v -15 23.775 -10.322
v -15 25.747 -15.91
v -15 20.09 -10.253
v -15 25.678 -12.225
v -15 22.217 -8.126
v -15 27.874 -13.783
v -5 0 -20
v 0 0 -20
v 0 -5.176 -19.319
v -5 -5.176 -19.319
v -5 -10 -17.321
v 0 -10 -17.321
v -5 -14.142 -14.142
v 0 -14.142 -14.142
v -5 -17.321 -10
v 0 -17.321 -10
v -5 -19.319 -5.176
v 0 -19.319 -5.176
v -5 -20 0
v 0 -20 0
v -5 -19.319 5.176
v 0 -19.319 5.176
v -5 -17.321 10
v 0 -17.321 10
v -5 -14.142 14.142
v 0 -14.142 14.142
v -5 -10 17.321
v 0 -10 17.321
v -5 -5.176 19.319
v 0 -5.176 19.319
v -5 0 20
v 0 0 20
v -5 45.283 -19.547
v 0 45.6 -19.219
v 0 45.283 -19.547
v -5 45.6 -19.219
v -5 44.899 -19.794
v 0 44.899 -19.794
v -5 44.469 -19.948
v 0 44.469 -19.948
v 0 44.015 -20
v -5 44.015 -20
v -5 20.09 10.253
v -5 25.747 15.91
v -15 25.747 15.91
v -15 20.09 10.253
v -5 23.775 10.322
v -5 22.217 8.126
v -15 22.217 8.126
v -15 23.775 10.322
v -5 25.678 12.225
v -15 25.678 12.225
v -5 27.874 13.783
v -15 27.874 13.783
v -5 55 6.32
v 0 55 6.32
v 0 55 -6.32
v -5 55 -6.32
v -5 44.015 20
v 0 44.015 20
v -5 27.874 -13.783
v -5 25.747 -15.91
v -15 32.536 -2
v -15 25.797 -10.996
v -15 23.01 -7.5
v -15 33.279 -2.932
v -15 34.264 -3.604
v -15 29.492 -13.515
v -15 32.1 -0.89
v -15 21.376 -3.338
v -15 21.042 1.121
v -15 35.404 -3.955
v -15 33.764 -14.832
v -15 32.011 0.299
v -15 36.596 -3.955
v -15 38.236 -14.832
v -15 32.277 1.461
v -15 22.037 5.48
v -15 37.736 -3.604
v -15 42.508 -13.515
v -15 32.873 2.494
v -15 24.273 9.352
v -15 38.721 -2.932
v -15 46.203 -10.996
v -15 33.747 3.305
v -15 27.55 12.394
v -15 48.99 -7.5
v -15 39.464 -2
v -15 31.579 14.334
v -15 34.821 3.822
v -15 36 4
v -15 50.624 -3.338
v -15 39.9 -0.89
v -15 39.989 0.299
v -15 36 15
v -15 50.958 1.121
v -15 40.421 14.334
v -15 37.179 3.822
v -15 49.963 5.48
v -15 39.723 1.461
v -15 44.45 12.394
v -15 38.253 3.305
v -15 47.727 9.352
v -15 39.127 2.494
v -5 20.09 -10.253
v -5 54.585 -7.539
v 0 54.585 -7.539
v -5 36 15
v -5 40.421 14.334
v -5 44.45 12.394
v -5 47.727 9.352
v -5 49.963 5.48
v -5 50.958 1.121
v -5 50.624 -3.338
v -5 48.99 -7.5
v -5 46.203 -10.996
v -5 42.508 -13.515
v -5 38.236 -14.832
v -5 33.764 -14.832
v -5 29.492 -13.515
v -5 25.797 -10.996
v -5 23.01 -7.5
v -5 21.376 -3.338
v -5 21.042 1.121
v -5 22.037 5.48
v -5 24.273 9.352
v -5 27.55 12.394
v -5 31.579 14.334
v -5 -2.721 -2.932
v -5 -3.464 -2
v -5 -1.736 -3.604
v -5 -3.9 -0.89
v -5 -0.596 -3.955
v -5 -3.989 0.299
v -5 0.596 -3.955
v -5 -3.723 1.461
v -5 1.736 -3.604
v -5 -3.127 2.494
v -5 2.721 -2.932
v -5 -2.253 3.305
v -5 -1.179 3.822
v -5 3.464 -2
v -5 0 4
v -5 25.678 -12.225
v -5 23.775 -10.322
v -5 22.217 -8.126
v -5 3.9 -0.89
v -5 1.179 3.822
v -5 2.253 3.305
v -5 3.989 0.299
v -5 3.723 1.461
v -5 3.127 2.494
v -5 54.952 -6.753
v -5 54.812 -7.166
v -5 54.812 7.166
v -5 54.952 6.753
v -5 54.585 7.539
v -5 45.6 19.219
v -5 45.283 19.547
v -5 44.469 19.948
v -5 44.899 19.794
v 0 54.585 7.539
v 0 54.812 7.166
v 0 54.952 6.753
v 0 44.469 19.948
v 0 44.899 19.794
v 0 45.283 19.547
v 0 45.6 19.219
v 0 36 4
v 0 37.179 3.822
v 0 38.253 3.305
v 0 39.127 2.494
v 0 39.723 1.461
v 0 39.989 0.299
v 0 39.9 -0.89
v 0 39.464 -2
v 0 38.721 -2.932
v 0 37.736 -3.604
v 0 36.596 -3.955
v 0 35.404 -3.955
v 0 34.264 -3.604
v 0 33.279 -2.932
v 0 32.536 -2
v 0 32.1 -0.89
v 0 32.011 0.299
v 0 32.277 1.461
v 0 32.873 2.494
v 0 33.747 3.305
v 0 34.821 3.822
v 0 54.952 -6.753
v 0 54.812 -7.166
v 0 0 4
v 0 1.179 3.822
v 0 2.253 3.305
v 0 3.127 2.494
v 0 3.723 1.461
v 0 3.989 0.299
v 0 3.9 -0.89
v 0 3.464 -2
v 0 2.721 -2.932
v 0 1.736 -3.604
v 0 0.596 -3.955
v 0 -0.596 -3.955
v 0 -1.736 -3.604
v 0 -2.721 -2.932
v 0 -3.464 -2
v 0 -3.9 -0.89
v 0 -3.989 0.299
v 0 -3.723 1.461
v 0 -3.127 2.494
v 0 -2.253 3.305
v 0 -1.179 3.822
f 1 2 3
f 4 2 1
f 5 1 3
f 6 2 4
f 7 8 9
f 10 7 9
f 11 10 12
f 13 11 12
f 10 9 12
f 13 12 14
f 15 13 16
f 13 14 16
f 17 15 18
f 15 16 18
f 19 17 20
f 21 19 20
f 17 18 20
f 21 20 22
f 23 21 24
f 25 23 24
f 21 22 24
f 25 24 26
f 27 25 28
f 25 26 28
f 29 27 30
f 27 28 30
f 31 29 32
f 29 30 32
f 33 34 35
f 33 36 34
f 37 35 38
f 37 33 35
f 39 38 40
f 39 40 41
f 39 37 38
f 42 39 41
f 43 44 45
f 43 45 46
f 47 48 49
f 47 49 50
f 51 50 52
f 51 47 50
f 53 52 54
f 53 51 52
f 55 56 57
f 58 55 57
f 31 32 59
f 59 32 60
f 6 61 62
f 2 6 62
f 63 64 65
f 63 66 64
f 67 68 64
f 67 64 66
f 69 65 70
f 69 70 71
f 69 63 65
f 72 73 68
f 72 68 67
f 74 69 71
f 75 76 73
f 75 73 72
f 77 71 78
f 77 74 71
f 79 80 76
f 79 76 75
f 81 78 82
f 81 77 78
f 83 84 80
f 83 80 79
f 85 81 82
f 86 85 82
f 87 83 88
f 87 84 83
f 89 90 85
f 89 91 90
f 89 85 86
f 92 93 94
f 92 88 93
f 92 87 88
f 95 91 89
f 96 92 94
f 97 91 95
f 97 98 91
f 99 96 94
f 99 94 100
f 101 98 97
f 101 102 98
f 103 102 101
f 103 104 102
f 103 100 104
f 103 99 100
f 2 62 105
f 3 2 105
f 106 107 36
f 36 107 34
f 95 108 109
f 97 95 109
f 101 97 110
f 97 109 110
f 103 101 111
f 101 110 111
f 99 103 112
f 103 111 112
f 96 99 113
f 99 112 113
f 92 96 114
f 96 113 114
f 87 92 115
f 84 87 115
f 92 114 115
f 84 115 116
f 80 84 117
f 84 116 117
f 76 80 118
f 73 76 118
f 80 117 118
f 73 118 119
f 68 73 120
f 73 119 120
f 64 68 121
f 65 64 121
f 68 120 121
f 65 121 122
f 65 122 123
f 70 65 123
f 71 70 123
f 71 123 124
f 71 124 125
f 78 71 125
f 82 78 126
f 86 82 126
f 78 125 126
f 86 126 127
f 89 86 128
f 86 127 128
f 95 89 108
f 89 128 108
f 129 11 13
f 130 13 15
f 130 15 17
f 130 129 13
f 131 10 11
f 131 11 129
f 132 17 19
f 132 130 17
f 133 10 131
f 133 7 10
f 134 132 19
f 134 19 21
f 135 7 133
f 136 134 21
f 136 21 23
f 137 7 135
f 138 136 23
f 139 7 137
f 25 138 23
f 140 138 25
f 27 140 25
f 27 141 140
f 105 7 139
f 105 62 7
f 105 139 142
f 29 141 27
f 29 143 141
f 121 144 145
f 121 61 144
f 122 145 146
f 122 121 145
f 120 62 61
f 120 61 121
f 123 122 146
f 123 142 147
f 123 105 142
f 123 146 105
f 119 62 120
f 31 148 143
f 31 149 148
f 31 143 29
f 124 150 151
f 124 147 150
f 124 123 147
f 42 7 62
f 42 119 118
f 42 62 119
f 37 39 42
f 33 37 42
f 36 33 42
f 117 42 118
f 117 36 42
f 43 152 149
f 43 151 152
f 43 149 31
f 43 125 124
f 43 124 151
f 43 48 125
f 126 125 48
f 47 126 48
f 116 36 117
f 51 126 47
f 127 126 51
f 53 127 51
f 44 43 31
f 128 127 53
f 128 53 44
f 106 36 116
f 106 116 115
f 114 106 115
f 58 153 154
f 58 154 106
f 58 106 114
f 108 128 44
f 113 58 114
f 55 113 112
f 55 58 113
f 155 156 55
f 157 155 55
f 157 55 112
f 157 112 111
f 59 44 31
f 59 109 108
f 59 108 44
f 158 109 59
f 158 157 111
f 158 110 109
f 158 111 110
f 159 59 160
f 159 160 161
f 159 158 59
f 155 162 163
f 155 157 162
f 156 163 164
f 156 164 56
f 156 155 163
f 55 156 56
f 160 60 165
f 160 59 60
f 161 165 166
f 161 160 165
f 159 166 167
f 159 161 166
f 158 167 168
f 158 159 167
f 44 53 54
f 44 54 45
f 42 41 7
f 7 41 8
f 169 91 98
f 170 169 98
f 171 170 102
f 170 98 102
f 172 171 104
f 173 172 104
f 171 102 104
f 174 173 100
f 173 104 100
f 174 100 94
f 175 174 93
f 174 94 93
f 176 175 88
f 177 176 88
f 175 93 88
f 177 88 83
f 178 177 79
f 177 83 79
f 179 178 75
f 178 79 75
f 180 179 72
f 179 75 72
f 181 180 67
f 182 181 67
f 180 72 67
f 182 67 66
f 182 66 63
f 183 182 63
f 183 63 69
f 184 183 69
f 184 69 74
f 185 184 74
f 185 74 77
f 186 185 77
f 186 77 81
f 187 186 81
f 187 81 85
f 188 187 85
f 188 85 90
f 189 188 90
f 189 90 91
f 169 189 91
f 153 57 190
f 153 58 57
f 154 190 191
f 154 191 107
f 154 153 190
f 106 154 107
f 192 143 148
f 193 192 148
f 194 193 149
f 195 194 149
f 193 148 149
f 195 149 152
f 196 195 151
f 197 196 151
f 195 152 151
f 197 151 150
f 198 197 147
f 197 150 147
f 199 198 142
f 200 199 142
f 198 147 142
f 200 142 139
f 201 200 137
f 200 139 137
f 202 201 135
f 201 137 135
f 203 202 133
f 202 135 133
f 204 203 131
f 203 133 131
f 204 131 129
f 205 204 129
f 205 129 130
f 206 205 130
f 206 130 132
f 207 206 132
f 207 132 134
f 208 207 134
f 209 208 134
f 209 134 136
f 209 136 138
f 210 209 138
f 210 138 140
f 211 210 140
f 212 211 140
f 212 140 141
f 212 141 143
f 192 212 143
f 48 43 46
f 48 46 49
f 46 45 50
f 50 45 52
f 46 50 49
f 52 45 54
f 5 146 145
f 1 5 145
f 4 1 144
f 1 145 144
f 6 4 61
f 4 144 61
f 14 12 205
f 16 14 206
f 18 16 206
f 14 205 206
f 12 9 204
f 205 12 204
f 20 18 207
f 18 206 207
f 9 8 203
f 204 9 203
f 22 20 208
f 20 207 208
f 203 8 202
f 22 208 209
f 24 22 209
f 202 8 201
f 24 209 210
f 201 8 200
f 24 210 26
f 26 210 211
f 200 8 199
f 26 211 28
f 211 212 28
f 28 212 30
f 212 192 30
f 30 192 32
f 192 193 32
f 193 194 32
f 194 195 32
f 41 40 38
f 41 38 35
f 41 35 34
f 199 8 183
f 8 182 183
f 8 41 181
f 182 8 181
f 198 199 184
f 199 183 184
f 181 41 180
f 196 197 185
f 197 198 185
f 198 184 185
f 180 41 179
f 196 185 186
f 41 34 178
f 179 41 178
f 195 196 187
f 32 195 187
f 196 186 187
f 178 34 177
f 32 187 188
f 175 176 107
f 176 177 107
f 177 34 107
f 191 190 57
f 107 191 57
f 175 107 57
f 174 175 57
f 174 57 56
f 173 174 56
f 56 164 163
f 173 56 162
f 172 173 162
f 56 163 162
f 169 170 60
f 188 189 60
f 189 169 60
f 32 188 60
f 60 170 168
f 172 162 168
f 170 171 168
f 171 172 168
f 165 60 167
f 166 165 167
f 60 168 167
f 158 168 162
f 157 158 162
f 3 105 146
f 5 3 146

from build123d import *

# Parameters (mm, degrees)
AUFSATZ_LINEAR_AUSTRAGEN1_DEPTH = 5
VERRUNDUNG2_R                   = 2
SKIZZE7_R                       = 15
AUFSATZ_LINEAR_AUSTRAGEN3_DEPTH = 10
AUFSATZ_LINEAR_AUSTRAGEN5_DEPTH = 10
SCHNITT_LINEAR_AUSTRAGEN2_REACH = 17
SKIZZE9_R                       = 4
SCHNITT_LINEAR_AUSTRAGEN3_REACH = 7
SKIZZE10_R                      = 4


with BuildPart() as part:
    # Skizze1 → Aufsatz-Linear austragen1 (new body)
    with BuildSketch(Plane(origin=(0, 0, 0), x_dir=(0, 0, -1), z_dir=(1, 0, 0))):
        with BuildLine():
            Line((-20, 0), (-20, 45))
            Line((-20, 45), (-7, 55))
            Line((-7, 55), (7, 55))
            Line((7, 55), (20, 45))
            Line((20, 45), (20, 0))
            ThreePointArc((20, 0), (0, -20), (-20, 0))
        make_face()
    extrude(amount=-AUFSATZ_LINEAR_AUSTRAGEN1_DEPTH)

    # Verrundung2
    verrundung2_edges = [part.edges().sort_by_distance(p)[0] for p in [
        (-2.5, 45, 20),
        (-2.5, 55, 7),
        (-2.5, 55, -7),
        (-2.5, 45, -20),
    ]]
    fillet(verrundung2_edges, radius=VERRUNDUNG2_R)

    # Skizze7 → Aufsatz-Linear austragen3 (add)
    with BuildSketch(Plane.ZY.offset(5)):
        with Locations((0, 36)):
            Circle(SKIZZE7_R)
    extrude(amount=AUFSATZ_LINEAR_AUSTRAGEN3_DEPTH)

    # Skizze8 → Aufsatz-Linear austragen5 (add)
    with BuildSketch(Plane.ZY.offset(5)):
        with BuildLine():
            Line((15.909902577, 25.746951673), (10.253048327, 20.090097423))
            Line((10.253048327, 20.090097423), (8.126024025, 22.217121725))
            ThreePointArc((8.126024025, 22.217121725), (11.313708499, 24.686291501), (13.782878275, 27.873975975))
            Line((13.782878275, 27.873975975), (15.909902577, 25.746951673))
        make_face()
    aufsatz_linear_austragen5 = extrude(amount=AUFSATZ_LINEAR_AUSTRAGEN5_DEPTH)

    # Spiegeln2: Aufsatz-Linear austragen5 across plane
    add(aufsatz_linear_austragen5.mirror(Plane.XY))

    # Skizze9 → Schnitt-Linear austragen2 (cut, up to next)
    with BuildSketch(Plane.ZY.offset(15), mode=Mode.PRIVATE) as schnitt_linear_austragen2_sk1:
        with Locations((0, 36)):
            Circle(SKIZZE9_R)
    schnitt_linear_austragen2_tool1 = extrude(schnitt_linear_austragen2_sk1.sketch, amount=-SCHNITT_LINEAR_AUSTRAGEN2_REACH, mode=Mode.PRIVATE) & part.part
    add(schnitt_linear_austragen2_tool1.solids().sort_by_distance((-15, 36, 0))[0], mode=Mode.SUBTRACT)

    # Skizze10 → Schnitt-Linear austragen3 (cut, up to next)
    with BuildSketch(Plane.ZY.offset(5), mode=Mode.PRIVATE) as schnitt_linear_austragen3_sk1:
        Circle(SKIZZE10_R)
    schnitt_linear_austragen3_tool1 = extrude(schnitt_linear_austragen3_sk1.sketch, amount=-SCHNITT_LINEAR_AUSTRAGEN3_REACH, mode=Mode.PRIVATE) & part.part
    add(schnitt_linear_austragen3_tool1.solids().sort_by_distance((-5, 0, 0))[0], mode=Mode.SUBTRACT)


solid = part.part
